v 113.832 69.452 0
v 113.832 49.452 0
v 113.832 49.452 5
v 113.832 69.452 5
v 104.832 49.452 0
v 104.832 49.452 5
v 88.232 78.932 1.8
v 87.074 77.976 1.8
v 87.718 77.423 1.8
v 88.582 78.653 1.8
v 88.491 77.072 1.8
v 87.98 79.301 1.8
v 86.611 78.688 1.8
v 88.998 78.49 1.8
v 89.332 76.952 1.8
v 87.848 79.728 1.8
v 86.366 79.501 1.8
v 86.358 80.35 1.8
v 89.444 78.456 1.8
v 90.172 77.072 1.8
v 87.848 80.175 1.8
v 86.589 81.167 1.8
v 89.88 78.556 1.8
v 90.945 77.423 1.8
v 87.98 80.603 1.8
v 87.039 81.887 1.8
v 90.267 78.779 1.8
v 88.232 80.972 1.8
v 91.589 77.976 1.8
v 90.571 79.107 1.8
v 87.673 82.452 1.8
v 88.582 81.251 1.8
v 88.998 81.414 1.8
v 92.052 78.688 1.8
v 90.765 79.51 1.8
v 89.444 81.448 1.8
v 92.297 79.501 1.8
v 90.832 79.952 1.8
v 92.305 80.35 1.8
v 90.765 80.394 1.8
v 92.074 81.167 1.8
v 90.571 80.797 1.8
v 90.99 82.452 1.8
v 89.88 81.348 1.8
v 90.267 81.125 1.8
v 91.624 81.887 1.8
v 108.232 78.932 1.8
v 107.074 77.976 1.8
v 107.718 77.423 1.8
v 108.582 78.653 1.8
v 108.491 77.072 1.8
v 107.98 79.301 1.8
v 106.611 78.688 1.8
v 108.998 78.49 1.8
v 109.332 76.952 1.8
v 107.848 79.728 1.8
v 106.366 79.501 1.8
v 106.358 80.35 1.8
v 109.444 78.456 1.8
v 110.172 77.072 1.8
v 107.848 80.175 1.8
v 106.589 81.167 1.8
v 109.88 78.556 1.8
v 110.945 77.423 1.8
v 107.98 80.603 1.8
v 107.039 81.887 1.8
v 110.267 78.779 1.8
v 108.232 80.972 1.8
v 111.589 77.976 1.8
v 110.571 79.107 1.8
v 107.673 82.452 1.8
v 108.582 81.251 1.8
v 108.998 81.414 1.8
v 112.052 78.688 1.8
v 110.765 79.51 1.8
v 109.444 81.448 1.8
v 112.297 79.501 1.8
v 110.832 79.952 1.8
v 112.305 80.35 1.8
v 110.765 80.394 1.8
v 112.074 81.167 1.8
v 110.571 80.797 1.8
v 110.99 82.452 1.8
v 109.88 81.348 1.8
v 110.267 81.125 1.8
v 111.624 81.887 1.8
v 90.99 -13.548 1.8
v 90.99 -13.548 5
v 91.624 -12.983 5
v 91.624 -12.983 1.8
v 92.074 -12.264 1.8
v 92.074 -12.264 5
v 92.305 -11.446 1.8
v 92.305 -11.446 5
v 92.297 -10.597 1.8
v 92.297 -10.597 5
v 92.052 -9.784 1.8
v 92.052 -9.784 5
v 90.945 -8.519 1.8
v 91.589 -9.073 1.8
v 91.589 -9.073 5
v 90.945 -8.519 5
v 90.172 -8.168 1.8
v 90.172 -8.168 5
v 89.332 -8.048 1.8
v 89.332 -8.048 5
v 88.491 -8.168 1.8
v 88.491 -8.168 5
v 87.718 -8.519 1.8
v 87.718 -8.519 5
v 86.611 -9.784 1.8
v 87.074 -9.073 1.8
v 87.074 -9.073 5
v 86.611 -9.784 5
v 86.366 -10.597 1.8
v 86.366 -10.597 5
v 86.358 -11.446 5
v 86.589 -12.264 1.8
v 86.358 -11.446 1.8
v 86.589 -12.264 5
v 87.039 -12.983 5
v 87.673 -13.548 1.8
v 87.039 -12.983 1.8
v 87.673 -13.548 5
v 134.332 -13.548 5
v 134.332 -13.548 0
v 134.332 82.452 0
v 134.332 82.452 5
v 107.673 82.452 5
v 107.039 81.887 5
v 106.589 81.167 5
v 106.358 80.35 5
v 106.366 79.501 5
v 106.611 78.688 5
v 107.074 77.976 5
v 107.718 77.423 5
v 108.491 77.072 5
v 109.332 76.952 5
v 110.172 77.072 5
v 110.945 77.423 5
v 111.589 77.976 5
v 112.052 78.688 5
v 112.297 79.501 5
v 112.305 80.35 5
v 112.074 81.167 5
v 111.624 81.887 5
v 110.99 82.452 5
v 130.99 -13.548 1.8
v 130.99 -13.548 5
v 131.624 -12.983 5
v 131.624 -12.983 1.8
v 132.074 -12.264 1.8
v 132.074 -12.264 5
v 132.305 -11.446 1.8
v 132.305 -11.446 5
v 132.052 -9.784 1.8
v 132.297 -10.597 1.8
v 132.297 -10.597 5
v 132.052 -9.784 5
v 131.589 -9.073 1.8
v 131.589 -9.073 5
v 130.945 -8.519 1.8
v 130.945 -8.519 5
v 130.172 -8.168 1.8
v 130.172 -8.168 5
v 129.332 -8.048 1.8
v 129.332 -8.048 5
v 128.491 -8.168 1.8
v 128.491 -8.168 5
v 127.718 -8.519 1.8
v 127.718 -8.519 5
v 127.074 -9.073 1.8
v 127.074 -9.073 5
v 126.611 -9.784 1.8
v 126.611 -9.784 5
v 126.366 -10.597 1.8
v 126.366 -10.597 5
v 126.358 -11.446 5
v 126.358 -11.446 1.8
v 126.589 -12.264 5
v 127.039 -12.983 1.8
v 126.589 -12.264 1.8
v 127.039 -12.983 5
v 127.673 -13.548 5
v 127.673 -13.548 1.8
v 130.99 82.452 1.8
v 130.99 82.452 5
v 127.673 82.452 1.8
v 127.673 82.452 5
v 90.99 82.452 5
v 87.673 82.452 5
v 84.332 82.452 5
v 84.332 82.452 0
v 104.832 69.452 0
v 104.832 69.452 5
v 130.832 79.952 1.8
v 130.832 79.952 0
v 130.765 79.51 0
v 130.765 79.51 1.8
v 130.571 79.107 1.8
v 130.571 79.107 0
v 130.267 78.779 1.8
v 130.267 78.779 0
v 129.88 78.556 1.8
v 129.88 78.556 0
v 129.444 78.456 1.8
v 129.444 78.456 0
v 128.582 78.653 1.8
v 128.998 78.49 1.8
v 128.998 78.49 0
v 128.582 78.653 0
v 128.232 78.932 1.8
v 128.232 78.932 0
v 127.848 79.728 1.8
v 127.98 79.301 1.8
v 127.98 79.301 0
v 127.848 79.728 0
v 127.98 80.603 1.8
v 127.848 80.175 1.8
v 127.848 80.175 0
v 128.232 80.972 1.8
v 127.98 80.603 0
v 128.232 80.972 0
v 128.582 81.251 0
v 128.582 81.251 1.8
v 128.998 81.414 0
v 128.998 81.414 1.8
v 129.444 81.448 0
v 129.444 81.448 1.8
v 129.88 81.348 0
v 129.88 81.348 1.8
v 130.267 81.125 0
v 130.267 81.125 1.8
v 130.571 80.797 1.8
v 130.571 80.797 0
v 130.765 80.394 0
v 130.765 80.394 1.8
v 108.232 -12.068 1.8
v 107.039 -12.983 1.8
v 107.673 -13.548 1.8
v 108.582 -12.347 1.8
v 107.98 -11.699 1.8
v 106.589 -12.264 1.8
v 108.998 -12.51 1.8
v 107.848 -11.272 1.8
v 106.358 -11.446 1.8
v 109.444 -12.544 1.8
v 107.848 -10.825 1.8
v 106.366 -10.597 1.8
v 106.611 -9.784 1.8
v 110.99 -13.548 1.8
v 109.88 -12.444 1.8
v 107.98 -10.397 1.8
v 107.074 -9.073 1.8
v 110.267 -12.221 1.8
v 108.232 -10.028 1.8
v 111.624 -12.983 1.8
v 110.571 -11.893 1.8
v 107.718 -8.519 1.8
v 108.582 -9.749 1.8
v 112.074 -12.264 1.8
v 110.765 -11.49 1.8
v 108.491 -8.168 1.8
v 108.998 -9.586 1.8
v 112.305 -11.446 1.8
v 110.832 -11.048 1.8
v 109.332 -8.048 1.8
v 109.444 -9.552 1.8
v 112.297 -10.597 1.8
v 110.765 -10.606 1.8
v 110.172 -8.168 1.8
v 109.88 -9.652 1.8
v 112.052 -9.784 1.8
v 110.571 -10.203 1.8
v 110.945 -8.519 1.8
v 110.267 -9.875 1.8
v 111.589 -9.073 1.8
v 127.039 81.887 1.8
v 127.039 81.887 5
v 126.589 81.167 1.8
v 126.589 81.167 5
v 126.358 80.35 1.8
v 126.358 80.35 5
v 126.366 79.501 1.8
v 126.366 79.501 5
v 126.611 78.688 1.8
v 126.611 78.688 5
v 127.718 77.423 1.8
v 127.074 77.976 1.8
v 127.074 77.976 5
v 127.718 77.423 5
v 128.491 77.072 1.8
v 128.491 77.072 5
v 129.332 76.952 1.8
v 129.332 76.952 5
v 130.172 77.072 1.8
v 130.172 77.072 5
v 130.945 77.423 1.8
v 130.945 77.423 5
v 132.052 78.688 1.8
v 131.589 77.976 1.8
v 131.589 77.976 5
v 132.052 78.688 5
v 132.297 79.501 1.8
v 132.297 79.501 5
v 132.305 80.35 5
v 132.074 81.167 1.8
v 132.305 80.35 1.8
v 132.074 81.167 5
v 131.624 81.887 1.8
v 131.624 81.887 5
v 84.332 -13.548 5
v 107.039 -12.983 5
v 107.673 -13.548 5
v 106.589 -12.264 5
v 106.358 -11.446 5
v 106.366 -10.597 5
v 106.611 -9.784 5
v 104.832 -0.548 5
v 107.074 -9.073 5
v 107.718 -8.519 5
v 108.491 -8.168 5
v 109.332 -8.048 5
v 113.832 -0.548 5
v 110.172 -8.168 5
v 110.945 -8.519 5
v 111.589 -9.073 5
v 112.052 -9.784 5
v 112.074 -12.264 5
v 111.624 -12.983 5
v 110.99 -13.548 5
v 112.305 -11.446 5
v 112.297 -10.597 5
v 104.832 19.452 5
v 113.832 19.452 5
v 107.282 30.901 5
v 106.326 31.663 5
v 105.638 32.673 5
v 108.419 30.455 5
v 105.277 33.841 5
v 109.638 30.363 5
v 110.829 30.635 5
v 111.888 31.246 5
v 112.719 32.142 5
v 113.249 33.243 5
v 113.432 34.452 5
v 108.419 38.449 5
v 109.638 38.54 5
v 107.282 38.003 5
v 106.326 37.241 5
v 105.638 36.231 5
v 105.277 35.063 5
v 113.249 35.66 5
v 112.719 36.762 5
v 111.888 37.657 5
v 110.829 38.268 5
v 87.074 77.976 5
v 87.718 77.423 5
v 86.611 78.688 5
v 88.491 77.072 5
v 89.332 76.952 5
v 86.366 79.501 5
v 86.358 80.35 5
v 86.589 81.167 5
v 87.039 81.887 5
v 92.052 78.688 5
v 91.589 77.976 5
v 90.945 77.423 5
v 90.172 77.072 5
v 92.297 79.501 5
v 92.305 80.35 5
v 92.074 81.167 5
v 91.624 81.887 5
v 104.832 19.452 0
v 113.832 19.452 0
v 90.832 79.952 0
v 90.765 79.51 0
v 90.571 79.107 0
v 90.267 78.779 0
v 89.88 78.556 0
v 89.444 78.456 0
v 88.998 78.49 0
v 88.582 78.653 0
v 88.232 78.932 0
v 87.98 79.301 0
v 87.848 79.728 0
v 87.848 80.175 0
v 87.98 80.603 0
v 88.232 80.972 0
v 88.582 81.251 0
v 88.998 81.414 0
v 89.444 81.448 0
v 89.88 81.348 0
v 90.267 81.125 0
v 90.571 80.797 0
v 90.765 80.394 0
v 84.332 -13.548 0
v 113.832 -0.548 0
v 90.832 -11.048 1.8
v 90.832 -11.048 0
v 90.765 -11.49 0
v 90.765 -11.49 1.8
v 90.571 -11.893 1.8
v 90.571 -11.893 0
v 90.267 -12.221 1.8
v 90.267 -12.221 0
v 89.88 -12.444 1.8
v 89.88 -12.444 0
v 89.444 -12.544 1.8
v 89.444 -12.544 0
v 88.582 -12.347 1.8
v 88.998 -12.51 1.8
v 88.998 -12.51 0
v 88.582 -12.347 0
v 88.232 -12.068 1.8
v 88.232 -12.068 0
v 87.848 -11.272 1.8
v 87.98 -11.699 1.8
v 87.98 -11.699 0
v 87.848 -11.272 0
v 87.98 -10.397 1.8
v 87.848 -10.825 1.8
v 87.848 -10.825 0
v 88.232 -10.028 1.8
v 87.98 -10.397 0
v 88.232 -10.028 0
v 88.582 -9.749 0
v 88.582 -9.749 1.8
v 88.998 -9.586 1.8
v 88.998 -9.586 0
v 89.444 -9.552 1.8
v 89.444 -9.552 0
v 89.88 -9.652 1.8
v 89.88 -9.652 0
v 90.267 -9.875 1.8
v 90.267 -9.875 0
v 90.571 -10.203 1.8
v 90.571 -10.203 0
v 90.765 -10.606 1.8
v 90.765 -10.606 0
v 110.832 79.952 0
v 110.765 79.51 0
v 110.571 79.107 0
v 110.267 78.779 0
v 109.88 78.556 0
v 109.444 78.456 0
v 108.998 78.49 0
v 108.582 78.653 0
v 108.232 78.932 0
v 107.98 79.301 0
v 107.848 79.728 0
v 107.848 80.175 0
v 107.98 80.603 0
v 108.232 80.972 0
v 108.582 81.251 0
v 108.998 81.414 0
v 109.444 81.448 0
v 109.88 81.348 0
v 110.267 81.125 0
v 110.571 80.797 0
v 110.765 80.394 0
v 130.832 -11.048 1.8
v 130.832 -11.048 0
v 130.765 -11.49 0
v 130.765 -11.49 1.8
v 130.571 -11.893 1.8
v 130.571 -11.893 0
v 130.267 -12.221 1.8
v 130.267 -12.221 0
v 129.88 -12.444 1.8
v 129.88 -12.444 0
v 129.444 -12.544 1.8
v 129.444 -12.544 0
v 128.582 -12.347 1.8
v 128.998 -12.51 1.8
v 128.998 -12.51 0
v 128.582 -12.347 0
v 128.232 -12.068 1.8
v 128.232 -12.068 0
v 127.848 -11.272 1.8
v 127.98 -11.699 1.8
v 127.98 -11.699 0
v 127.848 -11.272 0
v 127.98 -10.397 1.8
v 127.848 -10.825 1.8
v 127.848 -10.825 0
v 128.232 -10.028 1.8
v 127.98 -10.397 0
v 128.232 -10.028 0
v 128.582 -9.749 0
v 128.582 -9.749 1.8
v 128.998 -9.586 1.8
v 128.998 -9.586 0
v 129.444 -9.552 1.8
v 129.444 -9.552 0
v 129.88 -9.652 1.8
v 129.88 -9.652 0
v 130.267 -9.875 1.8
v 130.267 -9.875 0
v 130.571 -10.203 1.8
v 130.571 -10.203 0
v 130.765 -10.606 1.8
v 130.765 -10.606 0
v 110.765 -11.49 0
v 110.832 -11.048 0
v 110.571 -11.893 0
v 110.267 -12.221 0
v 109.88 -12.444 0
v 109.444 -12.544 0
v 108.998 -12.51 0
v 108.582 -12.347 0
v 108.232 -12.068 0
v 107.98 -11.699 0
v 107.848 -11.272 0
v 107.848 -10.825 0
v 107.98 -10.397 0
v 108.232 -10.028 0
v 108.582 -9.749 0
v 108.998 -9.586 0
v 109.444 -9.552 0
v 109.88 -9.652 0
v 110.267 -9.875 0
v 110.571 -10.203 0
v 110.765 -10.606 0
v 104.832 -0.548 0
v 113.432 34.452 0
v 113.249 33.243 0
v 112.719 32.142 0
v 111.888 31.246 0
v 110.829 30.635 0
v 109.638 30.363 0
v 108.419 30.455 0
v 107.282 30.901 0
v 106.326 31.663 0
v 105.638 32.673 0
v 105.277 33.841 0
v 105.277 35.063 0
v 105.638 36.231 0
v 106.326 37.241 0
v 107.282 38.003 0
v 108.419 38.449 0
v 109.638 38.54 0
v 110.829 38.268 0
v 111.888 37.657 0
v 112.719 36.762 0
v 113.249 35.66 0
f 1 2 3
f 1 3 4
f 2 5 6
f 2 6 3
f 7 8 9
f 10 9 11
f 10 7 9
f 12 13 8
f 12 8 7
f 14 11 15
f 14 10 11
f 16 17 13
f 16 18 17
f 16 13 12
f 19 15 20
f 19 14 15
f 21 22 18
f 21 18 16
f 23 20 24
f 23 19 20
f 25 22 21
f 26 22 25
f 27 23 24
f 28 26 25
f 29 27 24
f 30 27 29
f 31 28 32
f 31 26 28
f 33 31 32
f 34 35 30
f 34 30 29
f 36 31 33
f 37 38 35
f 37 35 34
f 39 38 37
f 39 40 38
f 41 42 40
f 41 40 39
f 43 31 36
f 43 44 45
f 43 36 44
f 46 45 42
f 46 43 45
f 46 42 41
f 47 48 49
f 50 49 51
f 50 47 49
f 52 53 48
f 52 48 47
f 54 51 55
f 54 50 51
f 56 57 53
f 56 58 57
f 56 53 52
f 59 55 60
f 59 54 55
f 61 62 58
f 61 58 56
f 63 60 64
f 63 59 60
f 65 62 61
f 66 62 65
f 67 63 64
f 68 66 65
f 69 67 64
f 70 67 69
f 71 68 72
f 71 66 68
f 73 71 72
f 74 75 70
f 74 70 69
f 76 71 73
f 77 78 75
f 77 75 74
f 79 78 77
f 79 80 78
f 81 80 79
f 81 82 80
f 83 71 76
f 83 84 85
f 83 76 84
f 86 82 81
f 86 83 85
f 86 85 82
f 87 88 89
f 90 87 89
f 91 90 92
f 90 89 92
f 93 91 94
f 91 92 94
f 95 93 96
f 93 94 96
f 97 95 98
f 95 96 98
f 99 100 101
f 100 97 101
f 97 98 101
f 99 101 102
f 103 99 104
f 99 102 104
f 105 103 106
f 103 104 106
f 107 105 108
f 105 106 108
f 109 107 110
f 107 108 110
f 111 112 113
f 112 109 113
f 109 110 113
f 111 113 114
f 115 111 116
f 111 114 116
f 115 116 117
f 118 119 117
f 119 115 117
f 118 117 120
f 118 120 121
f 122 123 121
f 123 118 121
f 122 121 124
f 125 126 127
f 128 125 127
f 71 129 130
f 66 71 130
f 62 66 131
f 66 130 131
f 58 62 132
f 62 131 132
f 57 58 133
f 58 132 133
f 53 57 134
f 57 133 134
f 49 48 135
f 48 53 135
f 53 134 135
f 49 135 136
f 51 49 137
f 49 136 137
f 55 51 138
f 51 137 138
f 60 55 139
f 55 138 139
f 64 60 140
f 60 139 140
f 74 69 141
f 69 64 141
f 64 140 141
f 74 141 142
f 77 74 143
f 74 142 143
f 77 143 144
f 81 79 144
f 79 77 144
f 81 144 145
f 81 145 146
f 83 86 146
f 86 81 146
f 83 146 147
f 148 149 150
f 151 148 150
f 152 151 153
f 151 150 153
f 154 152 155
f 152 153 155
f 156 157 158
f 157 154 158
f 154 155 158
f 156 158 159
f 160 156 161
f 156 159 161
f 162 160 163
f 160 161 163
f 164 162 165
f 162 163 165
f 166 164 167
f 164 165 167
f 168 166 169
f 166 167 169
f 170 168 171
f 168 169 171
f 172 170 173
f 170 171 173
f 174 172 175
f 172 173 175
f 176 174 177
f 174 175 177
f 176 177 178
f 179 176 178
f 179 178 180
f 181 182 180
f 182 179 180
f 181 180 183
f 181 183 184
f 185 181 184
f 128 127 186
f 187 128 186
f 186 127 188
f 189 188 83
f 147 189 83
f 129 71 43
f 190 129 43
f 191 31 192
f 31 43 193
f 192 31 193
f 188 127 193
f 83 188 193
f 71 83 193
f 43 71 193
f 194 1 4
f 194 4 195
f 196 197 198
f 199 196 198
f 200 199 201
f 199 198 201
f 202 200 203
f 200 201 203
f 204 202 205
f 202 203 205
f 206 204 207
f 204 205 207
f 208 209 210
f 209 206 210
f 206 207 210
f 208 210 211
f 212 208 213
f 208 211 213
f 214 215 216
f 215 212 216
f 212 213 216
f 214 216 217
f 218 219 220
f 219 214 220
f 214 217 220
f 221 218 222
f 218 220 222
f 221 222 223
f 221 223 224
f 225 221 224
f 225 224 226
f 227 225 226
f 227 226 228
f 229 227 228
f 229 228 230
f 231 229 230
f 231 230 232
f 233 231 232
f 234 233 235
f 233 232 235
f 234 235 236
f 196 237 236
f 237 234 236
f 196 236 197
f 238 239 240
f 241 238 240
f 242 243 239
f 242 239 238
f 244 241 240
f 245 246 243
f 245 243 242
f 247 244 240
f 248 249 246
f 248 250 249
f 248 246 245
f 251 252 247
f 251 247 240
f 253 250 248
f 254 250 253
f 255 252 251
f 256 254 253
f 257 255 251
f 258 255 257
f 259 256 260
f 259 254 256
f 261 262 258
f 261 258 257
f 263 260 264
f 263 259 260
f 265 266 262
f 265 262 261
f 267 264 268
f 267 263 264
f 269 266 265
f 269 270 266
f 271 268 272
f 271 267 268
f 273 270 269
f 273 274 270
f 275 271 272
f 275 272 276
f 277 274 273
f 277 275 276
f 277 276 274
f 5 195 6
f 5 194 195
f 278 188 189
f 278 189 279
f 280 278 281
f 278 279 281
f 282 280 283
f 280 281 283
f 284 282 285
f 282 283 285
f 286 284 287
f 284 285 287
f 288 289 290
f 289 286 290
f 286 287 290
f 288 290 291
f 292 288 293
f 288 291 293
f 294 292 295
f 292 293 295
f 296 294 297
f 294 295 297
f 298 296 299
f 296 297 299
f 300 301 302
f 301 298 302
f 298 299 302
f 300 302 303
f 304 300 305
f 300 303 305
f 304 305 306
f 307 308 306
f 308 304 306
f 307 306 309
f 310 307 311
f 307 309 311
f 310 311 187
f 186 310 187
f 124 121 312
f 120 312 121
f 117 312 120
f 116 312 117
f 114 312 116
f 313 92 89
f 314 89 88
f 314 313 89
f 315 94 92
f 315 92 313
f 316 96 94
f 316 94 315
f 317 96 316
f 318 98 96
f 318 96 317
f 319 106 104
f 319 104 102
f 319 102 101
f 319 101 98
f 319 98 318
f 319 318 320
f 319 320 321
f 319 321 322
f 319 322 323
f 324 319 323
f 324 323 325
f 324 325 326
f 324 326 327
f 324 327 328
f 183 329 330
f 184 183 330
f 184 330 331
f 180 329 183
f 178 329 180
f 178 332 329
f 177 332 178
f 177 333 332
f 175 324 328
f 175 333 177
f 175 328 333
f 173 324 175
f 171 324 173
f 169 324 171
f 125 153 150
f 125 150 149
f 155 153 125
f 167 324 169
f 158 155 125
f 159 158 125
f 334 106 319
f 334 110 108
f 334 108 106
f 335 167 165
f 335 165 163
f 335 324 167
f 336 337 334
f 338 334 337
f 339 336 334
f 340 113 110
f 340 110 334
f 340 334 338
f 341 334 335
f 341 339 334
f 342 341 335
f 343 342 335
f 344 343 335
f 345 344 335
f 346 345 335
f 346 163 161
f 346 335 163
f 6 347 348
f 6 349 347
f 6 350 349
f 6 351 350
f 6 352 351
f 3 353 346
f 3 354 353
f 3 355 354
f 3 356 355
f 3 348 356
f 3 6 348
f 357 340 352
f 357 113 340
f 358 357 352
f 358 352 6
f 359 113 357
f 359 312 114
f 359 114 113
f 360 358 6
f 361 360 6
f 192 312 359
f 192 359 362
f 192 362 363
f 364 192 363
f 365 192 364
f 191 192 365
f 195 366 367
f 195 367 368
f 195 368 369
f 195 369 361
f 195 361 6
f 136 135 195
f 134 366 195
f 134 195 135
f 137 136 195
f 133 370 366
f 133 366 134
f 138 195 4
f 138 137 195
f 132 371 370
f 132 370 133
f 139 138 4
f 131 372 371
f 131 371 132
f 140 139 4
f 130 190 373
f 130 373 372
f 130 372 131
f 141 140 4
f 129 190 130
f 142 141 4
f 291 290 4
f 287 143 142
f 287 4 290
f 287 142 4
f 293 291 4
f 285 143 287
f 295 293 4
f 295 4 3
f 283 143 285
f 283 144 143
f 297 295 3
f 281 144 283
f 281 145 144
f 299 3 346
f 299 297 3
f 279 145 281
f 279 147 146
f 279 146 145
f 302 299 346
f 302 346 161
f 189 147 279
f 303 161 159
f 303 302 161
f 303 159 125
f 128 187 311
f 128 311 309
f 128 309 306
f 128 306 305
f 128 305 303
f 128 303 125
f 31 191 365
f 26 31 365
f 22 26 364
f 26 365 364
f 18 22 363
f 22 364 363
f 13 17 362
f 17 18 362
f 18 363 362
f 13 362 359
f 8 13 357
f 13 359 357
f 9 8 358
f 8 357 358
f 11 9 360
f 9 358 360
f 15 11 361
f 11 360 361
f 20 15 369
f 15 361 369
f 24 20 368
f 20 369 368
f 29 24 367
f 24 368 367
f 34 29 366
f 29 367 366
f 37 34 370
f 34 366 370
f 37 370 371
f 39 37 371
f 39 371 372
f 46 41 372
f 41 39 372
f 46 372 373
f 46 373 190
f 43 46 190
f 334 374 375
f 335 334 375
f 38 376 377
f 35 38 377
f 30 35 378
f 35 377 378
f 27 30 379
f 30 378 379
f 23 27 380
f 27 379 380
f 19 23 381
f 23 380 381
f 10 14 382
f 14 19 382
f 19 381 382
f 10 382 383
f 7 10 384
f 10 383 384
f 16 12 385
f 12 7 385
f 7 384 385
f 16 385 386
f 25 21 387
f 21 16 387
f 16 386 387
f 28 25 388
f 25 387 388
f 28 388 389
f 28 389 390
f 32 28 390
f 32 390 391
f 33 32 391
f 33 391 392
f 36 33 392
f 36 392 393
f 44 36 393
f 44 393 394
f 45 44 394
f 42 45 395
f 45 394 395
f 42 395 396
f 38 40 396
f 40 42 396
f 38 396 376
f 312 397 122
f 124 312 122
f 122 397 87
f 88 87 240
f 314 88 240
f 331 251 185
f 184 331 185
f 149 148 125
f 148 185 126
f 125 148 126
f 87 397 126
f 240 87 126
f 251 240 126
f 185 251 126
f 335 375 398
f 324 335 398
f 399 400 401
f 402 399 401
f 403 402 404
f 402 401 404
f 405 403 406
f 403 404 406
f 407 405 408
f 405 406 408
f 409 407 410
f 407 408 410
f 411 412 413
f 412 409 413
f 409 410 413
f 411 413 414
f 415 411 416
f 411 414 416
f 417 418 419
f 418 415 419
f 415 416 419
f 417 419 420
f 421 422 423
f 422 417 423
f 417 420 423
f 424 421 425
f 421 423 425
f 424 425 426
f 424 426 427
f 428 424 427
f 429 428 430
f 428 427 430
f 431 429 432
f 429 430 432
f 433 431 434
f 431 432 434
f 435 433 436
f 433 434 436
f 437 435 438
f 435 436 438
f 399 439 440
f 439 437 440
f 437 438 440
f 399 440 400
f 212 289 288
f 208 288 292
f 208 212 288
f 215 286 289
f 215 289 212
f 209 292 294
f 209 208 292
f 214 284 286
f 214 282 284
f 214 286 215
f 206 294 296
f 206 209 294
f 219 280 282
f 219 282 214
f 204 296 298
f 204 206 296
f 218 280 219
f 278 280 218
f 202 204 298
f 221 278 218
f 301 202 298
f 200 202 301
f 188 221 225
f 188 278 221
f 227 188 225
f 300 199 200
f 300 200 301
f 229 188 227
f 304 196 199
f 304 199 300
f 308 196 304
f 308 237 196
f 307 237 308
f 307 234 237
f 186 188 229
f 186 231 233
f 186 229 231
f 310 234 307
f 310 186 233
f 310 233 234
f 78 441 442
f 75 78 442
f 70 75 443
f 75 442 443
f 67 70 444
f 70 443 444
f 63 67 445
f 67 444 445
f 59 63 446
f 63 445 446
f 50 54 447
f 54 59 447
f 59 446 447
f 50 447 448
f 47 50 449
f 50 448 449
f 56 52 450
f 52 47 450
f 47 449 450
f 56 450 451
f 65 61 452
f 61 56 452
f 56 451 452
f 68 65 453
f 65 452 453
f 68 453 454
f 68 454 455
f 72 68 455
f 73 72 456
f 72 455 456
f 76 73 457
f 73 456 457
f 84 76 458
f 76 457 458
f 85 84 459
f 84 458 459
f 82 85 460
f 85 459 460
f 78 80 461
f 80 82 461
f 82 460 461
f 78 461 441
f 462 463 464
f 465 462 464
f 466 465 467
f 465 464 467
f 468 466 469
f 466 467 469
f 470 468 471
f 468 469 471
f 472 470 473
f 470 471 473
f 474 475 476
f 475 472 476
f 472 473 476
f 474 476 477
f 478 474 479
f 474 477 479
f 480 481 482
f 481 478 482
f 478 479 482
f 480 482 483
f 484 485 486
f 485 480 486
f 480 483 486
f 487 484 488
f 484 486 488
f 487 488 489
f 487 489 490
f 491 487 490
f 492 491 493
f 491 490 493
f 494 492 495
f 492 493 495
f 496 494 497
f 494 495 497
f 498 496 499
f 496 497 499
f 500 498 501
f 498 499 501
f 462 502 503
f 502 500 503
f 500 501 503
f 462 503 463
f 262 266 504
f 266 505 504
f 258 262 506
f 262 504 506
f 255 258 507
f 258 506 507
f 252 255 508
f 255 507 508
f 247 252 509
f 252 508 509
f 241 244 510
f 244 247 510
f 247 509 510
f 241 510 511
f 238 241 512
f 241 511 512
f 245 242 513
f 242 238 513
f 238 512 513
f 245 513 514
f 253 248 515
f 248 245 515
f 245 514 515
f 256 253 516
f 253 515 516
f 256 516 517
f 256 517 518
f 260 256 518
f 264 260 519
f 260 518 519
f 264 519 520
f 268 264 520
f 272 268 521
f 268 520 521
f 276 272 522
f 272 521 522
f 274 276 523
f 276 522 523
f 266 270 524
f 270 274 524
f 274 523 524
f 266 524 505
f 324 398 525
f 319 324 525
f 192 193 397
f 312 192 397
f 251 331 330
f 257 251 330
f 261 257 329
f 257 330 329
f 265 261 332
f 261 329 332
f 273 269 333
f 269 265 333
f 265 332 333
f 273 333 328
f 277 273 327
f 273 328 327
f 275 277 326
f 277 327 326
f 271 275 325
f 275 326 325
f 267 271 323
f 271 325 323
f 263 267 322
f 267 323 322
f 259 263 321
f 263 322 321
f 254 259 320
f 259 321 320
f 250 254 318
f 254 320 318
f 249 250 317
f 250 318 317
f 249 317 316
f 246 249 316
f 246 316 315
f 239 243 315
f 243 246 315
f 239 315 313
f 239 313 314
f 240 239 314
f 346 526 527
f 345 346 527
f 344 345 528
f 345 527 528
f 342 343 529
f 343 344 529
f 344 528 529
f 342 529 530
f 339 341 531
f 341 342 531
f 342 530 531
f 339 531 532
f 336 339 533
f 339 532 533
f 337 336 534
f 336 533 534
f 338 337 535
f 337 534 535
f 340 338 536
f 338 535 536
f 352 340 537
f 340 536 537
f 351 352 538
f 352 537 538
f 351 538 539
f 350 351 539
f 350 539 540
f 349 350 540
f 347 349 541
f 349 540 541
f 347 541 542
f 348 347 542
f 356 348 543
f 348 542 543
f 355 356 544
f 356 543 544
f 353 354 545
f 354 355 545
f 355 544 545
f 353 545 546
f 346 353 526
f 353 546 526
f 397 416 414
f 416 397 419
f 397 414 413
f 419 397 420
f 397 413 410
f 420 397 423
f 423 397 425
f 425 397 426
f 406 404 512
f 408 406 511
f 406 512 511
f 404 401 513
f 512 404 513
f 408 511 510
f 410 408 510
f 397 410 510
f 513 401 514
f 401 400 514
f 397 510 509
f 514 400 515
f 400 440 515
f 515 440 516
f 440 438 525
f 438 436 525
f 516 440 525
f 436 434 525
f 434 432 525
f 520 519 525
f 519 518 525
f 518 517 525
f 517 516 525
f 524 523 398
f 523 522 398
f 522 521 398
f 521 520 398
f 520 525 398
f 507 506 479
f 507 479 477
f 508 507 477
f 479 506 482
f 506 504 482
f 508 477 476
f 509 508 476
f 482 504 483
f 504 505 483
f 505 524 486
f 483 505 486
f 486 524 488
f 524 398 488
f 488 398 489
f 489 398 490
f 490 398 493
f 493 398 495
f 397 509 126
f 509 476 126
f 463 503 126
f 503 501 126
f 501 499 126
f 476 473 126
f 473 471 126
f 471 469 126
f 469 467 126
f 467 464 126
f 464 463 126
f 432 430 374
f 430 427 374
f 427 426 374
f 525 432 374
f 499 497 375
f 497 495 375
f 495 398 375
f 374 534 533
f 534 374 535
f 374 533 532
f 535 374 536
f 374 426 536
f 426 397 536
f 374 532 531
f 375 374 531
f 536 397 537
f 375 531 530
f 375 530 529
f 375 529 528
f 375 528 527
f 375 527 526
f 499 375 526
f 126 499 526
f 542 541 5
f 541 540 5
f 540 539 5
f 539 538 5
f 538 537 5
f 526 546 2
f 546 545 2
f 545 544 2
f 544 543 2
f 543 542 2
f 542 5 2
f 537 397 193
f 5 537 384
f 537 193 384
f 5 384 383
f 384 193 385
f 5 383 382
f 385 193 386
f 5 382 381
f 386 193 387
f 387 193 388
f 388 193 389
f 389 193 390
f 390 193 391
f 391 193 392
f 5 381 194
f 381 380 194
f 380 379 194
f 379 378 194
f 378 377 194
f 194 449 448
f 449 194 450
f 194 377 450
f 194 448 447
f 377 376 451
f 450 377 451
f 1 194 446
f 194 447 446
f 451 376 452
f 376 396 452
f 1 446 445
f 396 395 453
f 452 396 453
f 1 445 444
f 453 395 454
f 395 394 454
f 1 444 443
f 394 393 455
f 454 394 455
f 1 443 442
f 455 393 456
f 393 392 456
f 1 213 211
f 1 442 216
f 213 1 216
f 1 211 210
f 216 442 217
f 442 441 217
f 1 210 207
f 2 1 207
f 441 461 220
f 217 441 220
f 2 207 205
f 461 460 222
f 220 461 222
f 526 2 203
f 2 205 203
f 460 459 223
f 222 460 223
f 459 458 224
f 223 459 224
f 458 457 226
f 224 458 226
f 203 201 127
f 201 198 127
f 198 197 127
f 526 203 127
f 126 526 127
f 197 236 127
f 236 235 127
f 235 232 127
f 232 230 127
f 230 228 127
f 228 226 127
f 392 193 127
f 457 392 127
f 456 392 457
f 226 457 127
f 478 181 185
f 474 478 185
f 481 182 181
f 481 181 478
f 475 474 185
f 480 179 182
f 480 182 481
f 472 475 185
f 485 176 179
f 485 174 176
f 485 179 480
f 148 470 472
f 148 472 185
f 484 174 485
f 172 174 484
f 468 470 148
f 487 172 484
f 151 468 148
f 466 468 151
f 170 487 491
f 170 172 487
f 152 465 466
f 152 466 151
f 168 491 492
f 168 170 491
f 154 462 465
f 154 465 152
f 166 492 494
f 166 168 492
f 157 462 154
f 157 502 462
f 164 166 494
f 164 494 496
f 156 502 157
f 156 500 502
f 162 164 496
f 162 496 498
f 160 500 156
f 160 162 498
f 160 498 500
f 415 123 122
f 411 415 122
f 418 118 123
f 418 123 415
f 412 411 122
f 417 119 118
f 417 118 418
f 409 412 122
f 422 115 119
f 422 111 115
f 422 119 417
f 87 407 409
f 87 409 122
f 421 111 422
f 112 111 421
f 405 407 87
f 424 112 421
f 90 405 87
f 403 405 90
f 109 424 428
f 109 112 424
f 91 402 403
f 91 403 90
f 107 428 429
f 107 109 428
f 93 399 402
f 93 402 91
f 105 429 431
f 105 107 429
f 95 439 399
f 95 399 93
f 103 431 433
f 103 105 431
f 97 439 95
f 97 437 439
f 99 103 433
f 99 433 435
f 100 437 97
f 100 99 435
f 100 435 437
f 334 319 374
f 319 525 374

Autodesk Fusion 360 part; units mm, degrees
sketch "Schizzo5" plane through (0, 0, 0) normal (0, 0, 1) x (1, 0, 0)
  line L0 (84.3315, 82.4519) -> (84.3315, -13.5481)
  circle A0 centre (89.3315, -11.0481) radius 1.5
  circle A1 centre (129.3315, 79.9519) radius 3
  line L1 (84.3315, 34.4519) -> (134.3315, 34.4519) construction
  circle A2 centre (109.3315, 79.9519) radius 1.5
  circle A3 centre (89.3315, 79.9519) radius 3
  circle A4 centre (89.3315, 79.9519) radius 1.5
  line L2 (134.3315, 82.4519) -> (84.3315, 82.4519)
  circle A5 centre (129.3315, 79.9519) radius 1.5
  circle A6 centre (109.3315, 79.9519) radius 3
  circle A7 centre (109.3315, 34.4519) radius 4.1
  circle A8 centre (109.3315, -11.0481) radius 1.5
  line L3 (134.3315, -13.5481) -> (134.3315, 82.4519)
  line L4 (89.3315, 82.4519) -> (89.3315, -13.5481) construction
  circle A9 centre (89.3315, -11.0481) radius 3
  circle A10 centre (109.3315, -11.0481) radius 3
  circle A11 centre (129.3315, -11.0481) radius 1.5
  line L5 (84.3315, -13.5481) -> (134.3315, -13.5481)
  circle A12 centre (129.3315, -11.0481) radius 3
  line L6 (84.3315, -11.0481) -> (134.3315, -11.0481) construction
  line L7 (109.3315, 82.4519) -> (109.3315, -13.5481) construction
  line L8 (109.3315, 34.4519) -> (109.3315, 59.4519) construction
  line L9 (113.8315, -0.5481) -> (104.8315, -0.5481)
  line L10 (104.8315, -0.5481) -> (104.8315, 19.4519)
  line L11 (104.8315, 19.4519) -> (113.8315, 19.4519)
  line L12 (113.8315, 19.4519) -> (113.8315, -0.5481)
  line L13 (113.8315, -0.5481) -> (104.8315, 19.4519) construction
  line L14 (104.8315, -0.5481) -> (113.8315, 19.4519) construction
  line L15 (113.8315, 49.4519) -> (113.8315, 69.4519)
  line L16 (104.8315, 49.4519) -> (113.8315, 49.4519)
  line L17 (104.8315, 69.4519) -> (104.8315, 49.4519)
  line L18 (113.8315, 69.4519) -> (104.8315, 69.4519)
  line L19 (104.8315, 69.4519) -> (113.8315, 49.4519) construction
  line L20 (113.8315, 69.4519) -> (104.8315, 49.4519) construction
  point P0 (127.8474, 12.2366)
  point P1 (109.3315, 9.4519)
  point P2 (109.3315, 59.4519)
  dimension "d221" = 50
  dimension "d222" = 96
  dimension "d223" = 2.5
  dimension "d224" = 20
  dimension "d225" = 3
  dimension "d226" = 6
  dimension "d227" = 3
  dimension "d228" = 6
  dimension "d229" = 8.2
  dimension "d354" = 9
  dimension "d355" = 20
  dimension "d356" = 50
extrude "Estrusione24" add sketch "Schizzo5" along normal blind 5 contours L0 A1 A3 L2 A6 L3 A9 A10 L5 A12 | A3 L2 | A9 L5 | L2 A6 | A10 L5 | A1 L2 | L5 A12 picked at (89.3689, 82.1172) picked at (89.3689, -13.2134) picked at (109.3689, 82.1172) picked at (109.3689, -13.2134) picked at (129.3689, 82.1172) picked at (129.3689, -13.2134)
extrude "Estrusione25" cut sketch "Schizzo5" against normal blind 3.2 from surface at 5 contours A3 L2 | A9 L5 | L2 A6 | A10 L5 | A1 L2 | L5 A12 picked at (89.3689, 82.1172) picked at (89.3689, -13.2134) picked at (109.3689, 82.1172) picked at (109.3689, -13.2134) picked at (129.3689, 82.1172) picked at (129.3689, -13.2134)
equation "d225 = d227"
equation "d226 = d228"
